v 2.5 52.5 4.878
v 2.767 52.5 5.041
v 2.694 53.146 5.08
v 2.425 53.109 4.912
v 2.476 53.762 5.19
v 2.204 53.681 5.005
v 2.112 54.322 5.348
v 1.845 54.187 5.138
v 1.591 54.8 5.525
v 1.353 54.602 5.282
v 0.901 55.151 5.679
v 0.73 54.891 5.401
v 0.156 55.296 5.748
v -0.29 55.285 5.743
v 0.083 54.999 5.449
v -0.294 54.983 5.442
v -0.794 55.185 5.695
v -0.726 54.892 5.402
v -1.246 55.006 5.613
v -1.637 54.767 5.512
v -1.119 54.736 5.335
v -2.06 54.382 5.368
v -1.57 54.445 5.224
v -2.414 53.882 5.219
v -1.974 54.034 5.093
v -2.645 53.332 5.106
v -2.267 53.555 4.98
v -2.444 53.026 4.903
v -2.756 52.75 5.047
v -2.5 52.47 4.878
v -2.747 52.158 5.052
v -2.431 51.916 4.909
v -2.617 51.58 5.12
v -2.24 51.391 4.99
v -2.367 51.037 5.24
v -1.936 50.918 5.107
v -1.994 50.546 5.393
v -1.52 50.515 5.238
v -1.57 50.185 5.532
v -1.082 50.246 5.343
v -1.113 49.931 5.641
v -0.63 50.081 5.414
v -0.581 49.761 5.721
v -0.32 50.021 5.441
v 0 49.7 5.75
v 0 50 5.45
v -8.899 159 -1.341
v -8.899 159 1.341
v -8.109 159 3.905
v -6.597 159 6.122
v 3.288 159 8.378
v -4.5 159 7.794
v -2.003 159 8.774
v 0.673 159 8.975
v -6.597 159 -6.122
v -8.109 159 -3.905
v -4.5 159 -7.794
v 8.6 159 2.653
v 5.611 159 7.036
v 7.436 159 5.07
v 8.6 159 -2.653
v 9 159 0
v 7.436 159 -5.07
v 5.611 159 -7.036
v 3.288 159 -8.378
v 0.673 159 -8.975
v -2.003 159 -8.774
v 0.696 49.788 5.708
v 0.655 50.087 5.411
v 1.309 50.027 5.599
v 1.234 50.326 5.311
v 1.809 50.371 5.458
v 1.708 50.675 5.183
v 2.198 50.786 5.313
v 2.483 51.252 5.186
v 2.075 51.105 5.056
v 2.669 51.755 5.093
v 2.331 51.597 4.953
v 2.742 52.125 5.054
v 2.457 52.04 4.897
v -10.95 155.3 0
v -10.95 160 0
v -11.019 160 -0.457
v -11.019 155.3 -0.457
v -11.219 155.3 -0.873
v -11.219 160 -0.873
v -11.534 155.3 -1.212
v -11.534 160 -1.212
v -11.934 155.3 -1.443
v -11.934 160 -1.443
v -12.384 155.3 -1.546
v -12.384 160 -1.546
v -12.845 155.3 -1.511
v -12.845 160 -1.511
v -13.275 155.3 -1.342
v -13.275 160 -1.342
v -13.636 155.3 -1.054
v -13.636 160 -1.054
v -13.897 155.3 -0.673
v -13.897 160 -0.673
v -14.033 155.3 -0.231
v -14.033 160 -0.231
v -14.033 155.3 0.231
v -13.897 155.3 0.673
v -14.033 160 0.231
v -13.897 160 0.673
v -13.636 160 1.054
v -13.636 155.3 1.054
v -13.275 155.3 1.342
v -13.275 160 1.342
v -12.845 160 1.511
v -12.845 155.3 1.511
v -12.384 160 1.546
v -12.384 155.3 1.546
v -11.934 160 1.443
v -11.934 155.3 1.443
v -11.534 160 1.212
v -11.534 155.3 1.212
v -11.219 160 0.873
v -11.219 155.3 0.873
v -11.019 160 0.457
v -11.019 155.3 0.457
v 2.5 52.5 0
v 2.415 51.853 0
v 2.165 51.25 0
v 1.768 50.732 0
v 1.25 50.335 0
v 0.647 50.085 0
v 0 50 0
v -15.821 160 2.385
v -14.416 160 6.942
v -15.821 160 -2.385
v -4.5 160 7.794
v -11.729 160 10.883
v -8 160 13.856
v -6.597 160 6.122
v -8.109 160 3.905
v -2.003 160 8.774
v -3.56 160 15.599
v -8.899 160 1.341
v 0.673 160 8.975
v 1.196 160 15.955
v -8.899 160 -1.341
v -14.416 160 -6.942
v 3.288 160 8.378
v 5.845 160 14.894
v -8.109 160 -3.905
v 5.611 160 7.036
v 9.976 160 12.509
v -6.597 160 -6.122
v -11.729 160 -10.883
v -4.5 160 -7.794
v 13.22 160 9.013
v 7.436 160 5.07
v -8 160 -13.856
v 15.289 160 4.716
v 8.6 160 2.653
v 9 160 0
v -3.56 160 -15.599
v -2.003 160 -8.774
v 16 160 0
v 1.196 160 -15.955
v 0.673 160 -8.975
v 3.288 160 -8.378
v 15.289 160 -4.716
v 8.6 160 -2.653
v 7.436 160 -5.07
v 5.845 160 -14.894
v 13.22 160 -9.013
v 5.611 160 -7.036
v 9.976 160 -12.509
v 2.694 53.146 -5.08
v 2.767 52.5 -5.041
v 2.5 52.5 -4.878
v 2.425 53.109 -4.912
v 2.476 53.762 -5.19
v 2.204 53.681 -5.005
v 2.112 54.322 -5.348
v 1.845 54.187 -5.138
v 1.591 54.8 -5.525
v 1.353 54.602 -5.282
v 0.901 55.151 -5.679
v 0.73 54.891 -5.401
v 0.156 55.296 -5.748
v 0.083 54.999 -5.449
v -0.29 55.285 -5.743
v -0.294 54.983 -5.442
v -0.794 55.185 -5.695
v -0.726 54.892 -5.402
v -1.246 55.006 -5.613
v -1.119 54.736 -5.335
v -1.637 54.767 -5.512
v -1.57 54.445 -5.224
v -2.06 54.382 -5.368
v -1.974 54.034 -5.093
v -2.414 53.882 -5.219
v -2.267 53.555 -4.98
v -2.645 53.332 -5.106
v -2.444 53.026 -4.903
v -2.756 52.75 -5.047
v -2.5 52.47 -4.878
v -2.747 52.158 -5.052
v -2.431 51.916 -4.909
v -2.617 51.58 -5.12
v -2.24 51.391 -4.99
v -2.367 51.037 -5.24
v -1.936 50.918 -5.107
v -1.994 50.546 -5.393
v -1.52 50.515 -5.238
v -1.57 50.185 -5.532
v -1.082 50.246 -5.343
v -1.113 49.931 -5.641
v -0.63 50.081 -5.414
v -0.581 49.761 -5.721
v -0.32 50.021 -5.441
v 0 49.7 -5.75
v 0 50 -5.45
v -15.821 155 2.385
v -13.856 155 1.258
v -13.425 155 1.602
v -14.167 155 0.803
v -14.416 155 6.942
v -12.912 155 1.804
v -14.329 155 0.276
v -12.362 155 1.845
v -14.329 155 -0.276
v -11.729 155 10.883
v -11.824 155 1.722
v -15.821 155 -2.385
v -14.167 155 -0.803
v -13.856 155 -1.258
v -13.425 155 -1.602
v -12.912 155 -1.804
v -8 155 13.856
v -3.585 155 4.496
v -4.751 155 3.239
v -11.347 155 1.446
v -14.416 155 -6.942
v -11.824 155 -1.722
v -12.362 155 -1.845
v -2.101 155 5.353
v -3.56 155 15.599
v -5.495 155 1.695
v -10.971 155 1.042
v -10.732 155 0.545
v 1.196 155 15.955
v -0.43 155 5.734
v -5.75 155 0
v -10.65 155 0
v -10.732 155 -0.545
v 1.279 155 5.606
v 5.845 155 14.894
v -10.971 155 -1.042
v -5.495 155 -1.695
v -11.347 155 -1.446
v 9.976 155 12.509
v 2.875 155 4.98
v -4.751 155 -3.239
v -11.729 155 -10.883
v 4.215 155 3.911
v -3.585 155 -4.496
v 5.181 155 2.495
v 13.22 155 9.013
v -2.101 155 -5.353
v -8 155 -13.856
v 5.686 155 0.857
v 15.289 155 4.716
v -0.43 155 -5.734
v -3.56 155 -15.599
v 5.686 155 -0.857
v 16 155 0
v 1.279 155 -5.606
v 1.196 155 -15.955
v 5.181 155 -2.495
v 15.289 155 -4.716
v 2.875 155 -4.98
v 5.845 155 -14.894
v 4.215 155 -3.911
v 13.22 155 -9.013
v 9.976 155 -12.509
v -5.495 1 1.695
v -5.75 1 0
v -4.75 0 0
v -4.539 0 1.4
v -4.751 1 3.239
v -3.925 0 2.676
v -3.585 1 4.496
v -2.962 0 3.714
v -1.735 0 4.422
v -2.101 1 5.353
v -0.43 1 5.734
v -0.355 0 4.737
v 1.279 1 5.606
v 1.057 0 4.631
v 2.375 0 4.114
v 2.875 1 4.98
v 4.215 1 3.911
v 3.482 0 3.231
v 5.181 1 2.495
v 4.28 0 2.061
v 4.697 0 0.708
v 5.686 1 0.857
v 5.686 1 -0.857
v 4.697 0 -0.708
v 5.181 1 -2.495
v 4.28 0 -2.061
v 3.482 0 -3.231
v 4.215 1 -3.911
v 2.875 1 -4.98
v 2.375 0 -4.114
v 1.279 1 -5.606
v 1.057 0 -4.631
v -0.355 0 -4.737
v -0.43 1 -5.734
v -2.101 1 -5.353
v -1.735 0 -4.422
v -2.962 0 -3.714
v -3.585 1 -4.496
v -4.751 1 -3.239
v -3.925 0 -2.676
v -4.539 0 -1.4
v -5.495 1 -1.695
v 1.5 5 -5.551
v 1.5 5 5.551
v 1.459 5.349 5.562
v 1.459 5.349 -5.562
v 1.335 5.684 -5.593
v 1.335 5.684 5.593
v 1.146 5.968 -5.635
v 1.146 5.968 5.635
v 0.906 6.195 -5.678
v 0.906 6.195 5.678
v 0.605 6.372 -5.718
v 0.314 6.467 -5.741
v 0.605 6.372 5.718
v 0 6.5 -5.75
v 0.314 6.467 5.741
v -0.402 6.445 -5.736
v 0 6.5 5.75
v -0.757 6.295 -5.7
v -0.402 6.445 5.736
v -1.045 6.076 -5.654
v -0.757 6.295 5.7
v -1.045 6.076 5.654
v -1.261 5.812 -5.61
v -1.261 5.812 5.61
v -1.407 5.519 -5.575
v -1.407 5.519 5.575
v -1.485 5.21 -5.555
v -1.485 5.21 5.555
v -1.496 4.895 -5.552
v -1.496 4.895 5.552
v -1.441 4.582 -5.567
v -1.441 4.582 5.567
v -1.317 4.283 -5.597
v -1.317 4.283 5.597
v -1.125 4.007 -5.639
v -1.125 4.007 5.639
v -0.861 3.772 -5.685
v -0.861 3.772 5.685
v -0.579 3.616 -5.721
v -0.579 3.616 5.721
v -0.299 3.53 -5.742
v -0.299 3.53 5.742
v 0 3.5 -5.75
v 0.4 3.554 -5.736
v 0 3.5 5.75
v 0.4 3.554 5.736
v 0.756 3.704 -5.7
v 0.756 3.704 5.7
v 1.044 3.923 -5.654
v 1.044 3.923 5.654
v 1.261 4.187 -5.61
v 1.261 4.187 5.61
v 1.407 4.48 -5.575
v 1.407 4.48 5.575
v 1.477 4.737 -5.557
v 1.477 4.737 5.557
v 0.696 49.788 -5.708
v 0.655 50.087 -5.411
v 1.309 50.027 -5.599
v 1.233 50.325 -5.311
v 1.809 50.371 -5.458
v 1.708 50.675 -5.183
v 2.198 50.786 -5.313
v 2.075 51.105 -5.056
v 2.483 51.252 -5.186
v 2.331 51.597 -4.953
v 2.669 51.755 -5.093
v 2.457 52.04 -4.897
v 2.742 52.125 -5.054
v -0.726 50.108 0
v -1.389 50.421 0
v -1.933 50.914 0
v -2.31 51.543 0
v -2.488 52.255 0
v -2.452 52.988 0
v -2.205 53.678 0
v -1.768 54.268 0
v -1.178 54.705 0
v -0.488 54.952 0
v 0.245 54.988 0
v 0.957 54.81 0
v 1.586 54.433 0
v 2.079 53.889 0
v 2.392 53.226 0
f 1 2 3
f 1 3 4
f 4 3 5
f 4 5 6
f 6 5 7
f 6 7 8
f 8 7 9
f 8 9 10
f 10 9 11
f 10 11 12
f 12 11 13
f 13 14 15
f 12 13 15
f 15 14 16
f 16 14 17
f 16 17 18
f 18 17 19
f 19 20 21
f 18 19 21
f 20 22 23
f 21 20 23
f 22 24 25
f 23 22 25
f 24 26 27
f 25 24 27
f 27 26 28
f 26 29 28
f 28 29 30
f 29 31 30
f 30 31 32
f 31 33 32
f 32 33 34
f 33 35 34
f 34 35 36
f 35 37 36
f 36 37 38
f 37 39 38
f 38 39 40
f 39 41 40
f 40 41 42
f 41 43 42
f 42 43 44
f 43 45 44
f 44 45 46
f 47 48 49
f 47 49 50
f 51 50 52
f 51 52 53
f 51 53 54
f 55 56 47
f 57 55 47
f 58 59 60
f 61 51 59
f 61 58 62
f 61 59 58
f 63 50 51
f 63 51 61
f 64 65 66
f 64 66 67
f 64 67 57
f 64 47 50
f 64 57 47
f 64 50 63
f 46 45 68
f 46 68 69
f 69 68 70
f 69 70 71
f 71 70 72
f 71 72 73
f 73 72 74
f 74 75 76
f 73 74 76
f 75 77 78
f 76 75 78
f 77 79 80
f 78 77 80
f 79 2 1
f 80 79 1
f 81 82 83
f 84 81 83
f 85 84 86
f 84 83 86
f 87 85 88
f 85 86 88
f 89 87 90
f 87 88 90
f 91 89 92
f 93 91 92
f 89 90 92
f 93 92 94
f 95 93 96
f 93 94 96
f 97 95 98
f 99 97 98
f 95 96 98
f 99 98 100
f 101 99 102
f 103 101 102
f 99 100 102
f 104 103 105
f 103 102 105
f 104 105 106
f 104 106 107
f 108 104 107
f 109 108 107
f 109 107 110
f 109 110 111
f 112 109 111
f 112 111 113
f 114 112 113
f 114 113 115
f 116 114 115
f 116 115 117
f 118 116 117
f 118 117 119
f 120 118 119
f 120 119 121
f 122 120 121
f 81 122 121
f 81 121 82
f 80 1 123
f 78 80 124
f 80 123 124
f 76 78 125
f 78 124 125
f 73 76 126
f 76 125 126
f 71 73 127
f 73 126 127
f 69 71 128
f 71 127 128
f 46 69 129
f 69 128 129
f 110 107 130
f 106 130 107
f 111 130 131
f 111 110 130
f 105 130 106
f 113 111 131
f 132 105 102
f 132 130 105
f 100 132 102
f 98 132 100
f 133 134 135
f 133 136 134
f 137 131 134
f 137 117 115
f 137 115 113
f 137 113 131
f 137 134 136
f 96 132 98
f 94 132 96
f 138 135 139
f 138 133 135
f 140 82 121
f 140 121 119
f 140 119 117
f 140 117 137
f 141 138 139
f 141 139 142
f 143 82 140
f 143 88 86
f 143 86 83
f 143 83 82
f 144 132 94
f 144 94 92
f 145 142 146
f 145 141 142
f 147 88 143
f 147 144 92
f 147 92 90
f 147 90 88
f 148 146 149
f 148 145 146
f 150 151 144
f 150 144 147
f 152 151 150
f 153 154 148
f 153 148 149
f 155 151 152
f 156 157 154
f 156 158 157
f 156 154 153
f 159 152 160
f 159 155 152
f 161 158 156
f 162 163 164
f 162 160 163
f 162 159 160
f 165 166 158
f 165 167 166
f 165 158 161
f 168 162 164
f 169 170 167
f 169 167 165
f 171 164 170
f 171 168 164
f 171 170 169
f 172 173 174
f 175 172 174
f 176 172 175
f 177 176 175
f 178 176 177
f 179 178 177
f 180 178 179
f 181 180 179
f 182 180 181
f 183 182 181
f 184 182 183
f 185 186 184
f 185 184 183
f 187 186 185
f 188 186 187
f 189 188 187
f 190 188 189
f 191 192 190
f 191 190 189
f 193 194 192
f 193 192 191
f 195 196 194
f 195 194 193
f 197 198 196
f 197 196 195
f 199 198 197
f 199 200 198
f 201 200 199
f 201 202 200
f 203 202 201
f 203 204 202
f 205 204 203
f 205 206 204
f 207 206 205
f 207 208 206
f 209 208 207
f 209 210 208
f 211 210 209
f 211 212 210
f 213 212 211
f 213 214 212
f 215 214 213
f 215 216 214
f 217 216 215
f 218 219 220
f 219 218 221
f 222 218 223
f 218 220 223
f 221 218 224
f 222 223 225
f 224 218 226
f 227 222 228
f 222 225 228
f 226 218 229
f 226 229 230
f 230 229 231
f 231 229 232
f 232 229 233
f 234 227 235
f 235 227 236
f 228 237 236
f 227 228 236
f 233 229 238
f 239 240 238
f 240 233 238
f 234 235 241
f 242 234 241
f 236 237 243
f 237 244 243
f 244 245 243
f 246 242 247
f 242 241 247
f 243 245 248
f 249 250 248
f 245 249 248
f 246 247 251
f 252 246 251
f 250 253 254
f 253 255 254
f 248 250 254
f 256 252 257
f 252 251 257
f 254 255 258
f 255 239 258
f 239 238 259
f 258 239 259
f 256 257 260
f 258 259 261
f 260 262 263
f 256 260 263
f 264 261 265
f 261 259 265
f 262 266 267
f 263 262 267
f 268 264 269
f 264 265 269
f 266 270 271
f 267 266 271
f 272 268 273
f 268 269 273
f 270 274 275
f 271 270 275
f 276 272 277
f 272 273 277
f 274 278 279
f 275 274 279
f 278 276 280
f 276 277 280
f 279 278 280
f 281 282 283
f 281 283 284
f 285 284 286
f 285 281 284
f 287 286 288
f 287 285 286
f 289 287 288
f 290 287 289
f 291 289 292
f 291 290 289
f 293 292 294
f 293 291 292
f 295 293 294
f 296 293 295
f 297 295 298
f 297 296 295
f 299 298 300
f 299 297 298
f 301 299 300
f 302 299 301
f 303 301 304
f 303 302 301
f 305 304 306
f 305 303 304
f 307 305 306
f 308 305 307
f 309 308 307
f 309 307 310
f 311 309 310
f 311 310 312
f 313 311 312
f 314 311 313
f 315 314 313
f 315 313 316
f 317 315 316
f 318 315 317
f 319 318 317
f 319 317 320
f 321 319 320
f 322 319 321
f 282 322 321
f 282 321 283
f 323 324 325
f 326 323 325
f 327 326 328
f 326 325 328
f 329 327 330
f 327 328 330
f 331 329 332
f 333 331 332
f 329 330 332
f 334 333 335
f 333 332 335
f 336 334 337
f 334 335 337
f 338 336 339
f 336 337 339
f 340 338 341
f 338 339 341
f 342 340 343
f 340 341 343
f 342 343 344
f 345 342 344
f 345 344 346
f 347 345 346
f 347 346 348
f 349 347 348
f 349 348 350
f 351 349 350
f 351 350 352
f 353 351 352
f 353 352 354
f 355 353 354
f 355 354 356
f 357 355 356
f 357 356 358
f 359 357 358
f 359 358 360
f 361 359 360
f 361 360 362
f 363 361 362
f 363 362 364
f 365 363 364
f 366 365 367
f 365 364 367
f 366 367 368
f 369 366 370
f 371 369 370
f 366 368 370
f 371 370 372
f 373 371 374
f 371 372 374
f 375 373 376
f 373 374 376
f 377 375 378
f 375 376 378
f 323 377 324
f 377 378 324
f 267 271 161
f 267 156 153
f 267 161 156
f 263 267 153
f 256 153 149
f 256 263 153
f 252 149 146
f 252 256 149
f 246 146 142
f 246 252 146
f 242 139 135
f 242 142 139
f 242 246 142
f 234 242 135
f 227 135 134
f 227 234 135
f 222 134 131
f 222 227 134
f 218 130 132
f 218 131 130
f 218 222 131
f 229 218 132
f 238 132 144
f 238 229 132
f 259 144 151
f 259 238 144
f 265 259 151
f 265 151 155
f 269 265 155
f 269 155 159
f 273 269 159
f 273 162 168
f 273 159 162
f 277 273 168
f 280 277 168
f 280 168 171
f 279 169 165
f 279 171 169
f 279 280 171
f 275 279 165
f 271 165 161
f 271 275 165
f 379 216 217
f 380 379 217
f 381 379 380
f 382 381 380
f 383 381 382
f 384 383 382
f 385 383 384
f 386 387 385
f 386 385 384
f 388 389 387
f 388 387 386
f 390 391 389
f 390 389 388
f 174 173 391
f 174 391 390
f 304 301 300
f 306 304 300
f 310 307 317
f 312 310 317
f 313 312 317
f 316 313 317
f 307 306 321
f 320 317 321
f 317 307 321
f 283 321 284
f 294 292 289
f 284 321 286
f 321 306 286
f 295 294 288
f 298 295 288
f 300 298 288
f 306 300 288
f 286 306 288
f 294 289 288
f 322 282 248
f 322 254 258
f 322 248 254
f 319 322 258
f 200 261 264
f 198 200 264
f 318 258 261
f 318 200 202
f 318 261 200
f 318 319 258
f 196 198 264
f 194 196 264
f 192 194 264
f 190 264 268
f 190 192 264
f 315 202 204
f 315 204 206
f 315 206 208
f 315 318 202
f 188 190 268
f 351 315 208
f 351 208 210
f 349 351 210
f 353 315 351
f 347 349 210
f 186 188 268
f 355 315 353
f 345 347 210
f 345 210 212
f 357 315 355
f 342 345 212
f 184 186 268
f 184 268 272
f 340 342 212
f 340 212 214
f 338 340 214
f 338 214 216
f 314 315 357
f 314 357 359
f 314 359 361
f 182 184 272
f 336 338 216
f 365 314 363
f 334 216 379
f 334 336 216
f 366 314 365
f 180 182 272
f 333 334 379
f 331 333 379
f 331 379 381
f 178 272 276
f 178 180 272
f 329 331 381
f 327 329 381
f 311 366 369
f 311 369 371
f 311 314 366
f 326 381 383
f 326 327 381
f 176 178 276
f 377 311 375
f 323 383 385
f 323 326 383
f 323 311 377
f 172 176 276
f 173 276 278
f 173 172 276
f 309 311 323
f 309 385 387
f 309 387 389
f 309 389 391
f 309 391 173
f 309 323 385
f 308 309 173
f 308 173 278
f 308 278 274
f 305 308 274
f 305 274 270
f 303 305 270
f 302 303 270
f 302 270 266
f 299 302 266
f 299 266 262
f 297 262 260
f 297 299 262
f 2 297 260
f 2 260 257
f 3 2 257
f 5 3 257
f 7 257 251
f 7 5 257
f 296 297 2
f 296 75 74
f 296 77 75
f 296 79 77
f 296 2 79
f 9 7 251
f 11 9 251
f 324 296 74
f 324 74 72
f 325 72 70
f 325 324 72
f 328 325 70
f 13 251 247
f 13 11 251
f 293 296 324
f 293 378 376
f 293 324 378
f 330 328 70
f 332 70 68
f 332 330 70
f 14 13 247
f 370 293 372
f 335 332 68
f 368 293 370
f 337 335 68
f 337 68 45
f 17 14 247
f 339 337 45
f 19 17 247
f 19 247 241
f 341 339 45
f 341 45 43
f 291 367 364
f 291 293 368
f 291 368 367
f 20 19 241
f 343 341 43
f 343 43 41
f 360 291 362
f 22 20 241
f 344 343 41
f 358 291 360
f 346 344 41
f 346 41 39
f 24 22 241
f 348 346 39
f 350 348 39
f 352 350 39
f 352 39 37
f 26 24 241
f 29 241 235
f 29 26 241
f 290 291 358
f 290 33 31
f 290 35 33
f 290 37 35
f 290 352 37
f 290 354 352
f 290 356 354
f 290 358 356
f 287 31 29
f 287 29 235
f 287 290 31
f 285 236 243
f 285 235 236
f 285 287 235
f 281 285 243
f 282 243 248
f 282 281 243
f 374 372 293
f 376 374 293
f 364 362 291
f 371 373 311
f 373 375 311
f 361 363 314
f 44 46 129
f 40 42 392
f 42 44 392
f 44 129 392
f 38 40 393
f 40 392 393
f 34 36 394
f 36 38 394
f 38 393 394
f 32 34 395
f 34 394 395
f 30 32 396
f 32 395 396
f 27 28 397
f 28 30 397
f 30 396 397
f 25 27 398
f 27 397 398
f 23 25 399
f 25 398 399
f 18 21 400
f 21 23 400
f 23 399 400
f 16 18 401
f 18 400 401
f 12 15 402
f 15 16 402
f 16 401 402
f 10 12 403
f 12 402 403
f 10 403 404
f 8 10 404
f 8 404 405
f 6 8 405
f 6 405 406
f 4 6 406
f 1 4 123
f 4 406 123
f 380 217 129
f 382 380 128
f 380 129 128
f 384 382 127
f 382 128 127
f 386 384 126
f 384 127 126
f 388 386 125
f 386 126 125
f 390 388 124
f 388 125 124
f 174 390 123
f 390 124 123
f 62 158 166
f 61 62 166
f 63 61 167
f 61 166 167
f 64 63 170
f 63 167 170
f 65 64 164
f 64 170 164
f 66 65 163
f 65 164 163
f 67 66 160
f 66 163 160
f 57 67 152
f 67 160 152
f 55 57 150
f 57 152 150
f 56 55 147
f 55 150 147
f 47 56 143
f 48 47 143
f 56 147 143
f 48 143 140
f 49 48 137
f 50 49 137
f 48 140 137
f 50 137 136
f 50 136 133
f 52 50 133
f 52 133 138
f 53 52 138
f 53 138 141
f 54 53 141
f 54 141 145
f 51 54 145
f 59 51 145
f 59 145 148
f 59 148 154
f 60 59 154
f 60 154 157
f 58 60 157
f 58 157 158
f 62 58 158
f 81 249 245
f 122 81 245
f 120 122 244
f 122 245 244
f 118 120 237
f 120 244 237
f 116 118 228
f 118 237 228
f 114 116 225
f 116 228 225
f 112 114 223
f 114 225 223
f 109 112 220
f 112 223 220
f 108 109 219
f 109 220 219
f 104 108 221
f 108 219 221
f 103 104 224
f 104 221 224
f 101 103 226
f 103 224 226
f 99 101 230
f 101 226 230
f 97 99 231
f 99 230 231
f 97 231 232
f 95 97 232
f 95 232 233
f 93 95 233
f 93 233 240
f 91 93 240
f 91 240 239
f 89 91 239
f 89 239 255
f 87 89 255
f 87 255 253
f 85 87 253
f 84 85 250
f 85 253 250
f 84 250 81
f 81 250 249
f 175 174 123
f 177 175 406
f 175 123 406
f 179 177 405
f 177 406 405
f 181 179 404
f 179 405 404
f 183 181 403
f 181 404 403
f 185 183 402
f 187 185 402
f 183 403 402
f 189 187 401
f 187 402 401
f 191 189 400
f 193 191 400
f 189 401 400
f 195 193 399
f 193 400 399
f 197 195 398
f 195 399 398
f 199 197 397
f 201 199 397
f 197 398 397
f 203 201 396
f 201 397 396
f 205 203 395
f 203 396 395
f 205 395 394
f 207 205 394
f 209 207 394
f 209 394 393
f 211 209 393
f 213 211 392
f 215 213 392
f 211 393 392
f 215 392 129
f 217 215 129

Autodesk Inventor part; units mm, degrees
ref_plane "YZ Plane" through (0, 0, 0) normal (1, 0, 0) x (0, 1, 0)
ref_plane "XZ Plane" through (0, 0, 0) normal (0, 1, 0) x (-1, 0, 0)
sketch "Sketch1" plane through (0, 0, 0) normal (0, 1, 0) x (-1, 0, 0)
  circle A0 centre (0, 0) radius 5.75
  dimension "d0" = 11.5
extrude "Extrusion1" add sketch "Sketch1" along normal blind 155
sketch "Sketch2" plane through (0, 155, 0) normal (0, 1, 0) x (1, 0, 0)
  circle A0 centre (0, 0) radius 16
  dimension "d3" = 32
extrude "Extrusion2" add sketch "Sketch2" along normal blind 5
sketch "Sketch3" plane through (0, 160, 0) normal (0, 1, 0) x (1, 0, 0)
  circle A0 centre (0, 0) radius 9
  dimension "d6" = 18
extrude "Extrusion3" cut sketch "Sketch3" against normal blind 1
ref_plane "Work Plane1" through (0, 0, 5.75) normal (0, 0, 1) x (1, 0, 0)
sketch "Sketch4" plane through (0, 0, 5.75) normal (0, 0, 1) x (1, 0, 0)
  line L0 (5.75, 155) -> (-5.75, 155) projected
  line L1 (5.75, 0) -> (-5.75, 0) projected
  line L2 (0, 0) -> (0, 5)
  circle A0 centre (0, 5) radius 1.5
  dimension "d9" = 5
  dimension "d10" = 3
extrude "Extrusion4" cut sketch "Sketch4" against normal blind 11.5
chamfer "Chamfer1" distance 1 angle 45 1 edges at (5.75, 0, 0)
sketch "Sketch5" plane through (0, 0, 0) normal (0, 0, 1) x (1, 0, 0)
  line L0 (0, 0) -> (0, 42.5)
  line L1 (0, 42.5) -> (0, 32.5)
  line L2 (0, 42.5) -> (0, 52.5)
  circle A0 centre (0, 52.5) radius 2.5
  dimension "d16" = 42.5
  dimension "d17" = 10
  dimension "d18" = 10
  dimension "d19" = 5
extrude "Extrusion5" cut sketch "Sketch5" along normal mid plane 13
sketch "Sketch6" plane through (0, 160, 0) normal (0, 1, 0) x (1, 0, 0)
  circle A0 centre (0, 0) radius 16 projected
  line L0 (-16, 0) -> (-9, 0)
  circle A1 centre (0, 0) radius 9 projected
  circle A2 centre (-12.5, 0) radius 1.55
  dimension "d22" = 3.1
extrude "Extrusion6" cut sketch "Sketch6" against normal up to surface (5 mm away) contours A2 L0 | L0 A2
chamfer "Chamfer2" distance 0.3 angle 45 1 edges at (-14.05, 155, 0)
chamfer "Chamfer3" distance 0.3 angle 45 2 edges at (-2.5, 52.5, 5.1781) (-2.5, 52.5, -5.1781)
properties part number "wał_hamulca_dlugi" material "ABS Plastic"
